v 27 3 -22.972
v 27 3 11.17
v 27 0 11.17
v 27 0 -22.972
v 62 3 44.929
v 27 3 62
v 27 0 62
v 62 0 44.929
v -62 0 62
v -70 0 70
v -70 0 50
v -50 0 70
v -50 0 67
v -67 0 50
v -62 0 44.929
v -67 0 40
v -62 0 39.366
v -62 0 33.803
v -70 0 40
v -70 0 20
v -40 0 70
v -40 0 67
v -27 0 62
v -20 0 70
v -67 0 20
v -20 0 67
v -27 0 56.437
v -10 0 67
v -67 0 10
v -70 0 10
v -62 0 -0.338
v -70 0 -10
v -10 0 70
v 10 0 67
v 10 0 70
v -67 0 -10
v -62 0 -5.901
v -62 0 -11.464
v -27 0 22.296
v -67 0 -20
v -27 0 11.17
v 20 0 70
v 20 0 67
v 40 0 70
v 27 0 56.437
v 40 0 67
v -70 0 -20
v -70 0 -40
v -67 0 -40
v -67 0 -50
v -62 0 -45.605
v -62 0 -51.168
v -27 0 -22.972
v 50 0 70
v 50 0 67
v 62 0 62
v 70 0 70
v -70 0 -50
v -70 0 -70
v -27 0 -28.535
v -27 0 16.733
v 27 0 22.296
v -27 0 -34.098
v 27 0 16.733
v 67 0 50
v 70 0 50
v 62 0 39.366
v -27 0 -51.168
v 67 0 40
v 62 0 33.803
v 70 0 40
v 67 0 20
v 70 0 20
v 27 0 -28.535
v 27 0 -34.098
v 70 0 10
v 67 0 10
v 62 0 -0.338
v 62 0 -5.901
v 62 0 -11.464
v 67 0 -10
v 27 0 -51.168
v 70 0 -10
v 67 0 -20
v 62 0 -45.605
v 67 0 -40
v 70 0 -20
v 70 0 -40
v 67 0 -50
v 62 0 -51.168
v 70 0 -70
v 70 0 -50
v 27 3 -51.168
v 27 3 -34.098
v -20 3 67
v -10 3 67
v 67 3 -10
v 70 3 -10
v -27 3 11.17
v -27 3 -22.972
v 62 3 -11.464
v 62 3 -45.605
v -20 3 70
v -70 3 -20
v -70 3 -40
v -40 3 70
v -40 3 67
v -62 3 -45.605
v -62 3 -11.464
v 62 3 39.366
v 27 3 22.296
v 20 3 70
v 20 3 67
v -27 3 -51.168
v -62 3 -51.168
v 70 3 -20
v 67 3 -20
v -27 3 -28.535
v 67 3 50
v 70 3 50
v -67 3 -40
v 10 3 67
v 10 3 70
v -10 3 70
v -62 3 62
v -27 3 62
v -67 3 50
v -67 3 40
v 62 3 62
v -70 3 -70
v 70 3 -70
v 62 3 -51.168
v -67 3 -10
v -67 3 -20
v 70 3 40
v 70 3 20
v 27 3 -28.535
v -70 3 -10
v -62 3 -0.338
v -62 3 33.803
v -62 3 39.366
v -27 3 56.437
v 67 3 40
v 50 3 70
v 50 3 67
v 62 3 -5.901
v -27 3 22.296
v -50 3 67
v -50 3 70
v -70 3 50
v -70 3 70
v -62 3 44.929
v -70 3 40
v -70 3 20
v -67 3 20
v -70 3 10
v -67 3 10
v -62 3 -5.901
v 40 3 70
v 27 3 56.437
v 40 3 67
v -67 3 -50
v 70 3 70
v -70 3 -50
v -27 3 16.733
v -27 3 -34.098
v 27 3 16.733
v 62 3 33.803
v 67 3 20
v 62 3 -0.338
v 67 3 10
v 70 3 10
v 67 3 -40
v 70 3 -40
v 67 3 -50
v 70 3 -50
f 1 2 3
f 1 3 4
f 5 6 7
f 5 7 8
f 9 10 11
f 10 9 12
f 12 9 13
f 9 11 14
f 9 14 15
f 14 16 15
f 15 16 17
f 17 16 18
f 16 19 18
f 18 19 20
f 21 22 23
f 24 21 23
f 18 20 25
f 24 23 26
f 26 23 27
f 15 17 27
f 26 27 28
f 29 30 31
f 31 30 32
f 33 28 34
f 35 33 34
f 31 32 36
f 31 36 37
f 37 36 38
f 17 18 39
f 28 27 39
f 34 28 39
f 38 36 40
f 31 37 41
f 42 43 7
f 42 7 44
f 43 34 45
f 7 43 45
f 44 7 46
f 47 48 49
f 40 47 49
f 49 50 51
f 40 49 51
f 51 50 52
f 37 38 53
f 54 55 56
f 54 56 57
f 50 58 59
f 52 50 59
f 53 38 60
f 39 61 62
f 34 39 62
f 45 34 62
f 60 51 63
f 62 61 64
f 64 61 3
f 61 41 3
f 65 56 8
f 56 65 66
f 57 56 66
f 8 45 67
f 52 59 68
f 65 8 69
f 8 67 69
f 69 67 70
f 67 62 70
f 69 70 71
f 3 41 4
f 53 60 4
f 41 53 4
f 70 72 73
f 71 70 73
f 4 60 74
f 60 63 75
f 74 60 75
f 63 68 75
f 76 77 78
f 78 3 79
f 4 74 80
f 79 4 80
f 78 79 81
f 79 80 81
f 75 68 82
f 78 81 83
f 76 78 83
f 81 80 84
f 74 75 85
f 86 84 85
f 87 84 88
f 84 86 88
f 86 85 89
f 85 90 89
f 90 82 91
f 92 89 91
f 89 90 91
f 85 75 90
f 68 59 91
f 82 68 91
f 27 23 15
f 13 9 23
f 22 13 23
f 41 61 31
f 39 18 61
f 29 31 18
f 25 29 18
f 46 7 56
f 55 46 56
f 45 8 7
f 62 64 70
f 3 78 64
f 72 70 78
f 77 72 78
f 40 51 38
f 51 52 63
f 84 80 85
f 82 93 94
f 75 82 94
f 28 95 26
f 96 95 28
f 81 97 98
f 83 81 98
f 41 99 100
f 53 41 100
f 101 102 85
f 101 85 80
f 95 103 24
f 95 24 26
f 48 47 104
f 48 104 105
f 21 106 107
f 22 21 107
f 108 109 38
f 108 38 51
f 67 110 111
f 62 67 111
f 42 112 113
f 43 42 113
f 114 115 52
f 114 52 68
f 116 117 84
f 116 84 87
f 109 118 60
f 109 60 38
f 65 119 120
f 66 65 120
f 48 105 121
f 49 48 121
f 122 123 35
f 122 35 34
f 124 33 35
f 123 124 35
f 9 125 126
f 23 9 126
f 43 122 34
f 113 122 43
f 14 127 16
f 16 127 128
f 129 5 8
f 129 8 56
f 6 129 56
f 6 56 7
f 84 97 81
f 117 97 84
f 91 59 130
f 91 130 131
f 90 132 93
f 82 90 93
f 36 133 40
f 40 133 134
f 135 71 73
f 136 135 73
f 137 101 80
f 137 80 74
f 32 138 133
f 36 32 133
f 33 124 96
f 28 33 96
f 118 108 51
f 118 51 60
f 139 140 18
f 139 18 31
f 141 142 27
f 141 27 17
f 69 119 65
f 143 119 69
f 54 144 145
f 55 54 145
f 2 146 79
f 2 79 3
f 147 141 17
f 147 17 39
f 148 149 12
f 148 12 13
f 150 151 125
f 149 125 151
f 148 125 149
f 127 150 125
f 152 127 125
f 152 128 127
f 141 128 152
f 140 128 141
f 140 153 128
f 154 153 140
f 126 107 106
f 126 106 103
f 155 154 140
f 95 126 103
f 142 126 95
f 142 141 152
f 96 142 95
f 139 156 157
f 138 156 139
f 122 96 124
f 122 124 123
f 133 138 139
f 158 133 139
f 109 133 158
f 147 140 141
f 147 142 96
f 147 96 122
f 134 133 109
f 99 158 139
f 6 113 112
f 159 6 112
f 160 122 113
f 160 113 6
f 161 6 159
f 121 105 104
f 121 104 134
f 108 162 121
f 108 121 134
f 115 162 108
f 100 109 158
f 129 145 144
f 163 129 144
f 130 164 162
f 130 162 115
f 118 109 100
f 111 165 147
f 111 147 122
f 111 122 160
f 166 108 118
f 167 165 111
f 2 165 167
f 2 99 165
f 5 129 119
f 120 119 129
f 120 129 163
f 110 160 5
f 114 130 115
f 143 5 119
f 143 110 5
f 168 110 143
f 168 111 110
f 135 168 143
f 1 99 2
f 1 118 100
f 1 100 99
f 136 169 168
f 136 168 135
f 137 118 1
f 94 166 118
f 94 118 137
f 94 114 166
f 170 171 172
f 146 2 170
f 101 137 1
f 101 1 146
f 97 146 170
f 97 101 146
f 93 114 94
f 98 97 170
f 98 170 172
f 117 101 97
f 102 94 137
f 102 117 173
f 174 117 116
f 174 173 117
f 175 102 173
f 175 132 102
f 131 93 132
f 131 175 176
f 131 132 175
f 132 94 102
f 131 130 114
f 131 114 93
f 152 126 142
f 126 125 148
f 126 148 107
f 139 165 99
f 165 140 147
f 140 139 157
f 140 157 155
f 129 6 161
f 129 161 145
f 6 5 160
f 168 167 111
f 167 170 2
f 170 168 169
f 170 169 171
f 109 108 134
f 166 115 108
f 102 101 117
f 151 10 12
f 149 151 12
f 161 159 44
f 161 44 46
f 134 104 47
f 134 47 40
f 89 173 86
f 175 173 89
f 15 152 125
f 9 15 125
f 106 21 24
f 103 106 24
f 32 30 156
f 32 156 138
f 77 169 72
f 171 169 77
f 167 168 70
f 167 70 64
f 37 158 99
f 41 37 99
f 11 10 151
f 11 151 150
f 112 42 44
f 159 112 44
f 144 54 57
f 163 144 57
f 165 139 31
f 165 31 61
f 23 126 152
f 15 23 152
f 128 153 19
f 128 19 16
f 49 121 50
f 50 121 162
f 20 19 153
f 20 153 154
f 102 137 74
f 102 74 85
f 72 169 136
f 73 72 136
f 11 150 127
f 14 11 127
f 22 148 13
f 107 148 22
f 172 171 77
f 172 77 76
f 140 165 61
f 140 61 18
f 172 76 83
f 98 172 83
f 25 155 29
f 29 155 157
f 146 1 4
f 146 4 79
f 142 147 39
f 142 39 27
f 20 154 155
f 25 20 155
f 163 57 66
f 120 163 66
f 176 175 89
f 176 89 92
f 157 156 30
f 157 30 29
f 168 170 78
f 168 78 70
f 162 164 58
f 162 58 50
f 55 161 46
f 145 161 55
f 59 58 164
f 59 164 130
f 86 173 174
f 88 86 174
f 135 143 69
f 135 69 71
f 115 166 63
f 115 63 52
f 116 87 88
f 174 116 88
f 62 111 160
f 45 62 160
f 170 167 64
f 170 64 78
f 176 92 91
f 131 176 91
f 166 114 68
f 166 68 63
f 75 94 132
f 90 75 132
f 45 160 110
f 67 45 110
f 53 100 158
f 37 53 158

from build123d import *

# Parameters (mm, degrees)
SKETCH1_W           = 140
SKETCH1_H           = 140
BOSS_EXTRUDE1_DEPTH = 3
CUT_EXTRUDE1_DEPTH  = 10
SKETCH3_W           = 3
SKETCH3_H           = 10
CUT_EXTRUDE2_DEPTH  = 13
SKETCH4_W           = 10
SKETCH4_H           = 3
CUT_EXTRUDE3_DEPTH  = 13


with BuildPart() as part:
    # Sketch1 → Boss-Extrude1 (new body)
    with BuildSketch(Plane(origin=(0, 0, 0), x_dir=(1, 0, 0), z_dir=(0, 1, 0))):
        Rectangle(SKETCH1_W, SKETCH1_H)
    extrude(amount=BOSS_EXTRUDE1_DEPTH)

    # Sketch2 → Cut-Extrude1 (cut)
    with BuildSketch(Plane(origin=(0, 3, 0), x_dir=(1, 0, 0), z_dir=(0, 1, 0))):
        Polygon((62, -62), (27, -62), (62, -44.9293594), align=None)
        Polygon((27, -56.436990298), (62, -39.366349698), (27, -22.295709098), align=None)
        Polygon((27, -16.732699396), (62, 0.337941204), (62, -33.803339995), align=None)
        Polygon((62, 5.900950907), (27, -11.169689693), (27, 22.971591506), align=None)
        Polygon((27, 28.534601209), (62, 45.605241809), (62, 11.463960609), align=None)
        Polygon((27, 34.097610911), (62, 51.168251511), (27, 51.168251511), align=None)
        Polygon((-27, -62), (-62, -44.9293594), (-62, -62), align=None)
        Polygon((-62, -39.366349698), (-27, -22.295709098), (-27, -56.436990298), align=None)
        Polygon((-27, -16.732699396), (-62, -33.803339995), (-62, 0.337941204), align=None)
        Polygon((-27, 22.971591506), (-62, 5.900950907), (-27, -11.169689693), align=None)
        Polygon((-27, 28.534601209), (-62, 11.463960609), (-62, 45.605241809), align=None)
        Polygon((-62, 51.168251511), (-27, 51.168251511), (-27, 34.097610911), align=None)
    extrude(amount=-CUT_EXTRUDE1_DEPTH, mode=Mode.SUBTRACT)

    # Sketch3 → Cut-Extrude2 (cut)
    with BuildSketch(Plane(origin=(0, 3, 0), x_dir=(1, 0, 0), z_dir=(0, 1, 0))):
        with Locations((68.5, -45)):
            Rectangle(SKETCH3_W, SKETCH3_H)
        with Locations((68.5, -15)):
            Rectangle(SKETCH3_W, SKETCH3_H)
        with Locations((68.5, 15)):
            Rectangle(SKETCH3_W, SKETCH3_H)
        with Locations((68.5, 45)):
            Rectangle(SKETCH3_W, SKETCH3_H)
        with Locations((-68.5, -45)):
            Rectangle(SKETCH3_W, SKETCH3_H)
        with Locations((-68.5, -15)):
            Rectangle(SKETCH3_W, SKETCH3_H)
        with Locations((-68.5, 15)):
            Rectangle(SKETCH3_W, SKETCH3_H)
        with Locations((-68.5, 45)):
            Rectangle(SKETCH3_W, SKETCH3_H)
    extrude(amount=-CUT_EXTRUDE2_DEPTH, mode=Mode.SUBTRACT)

    # Sketch4 → Cut-Extrude3 (cut)
    with BuildSketch(Plane(origin=(0, 3, 0), x_dir=(1, 0, 0), z_dir=(0, 1, 0))):
        with Locations((-45, -68.5)):
            Rectangle(SKETCH4_W, SKETCH4_H)
        with Locations((-15, -68.5)):
            Rectangle(SKETCH4_W, SKETCH4_H)
        with Locations((15, -68.5)):
            Rectangle(SKETCH4_W, SKETCH4_H)
        with Locations((45, -68.5)):
            Rectangle(SKETCH4_W, SKETCH4_H)
    extrude(amount=-CUT_EXTRUDE3_DEPTH, mode=Mode.SUBTRACT)


solid = part.part
